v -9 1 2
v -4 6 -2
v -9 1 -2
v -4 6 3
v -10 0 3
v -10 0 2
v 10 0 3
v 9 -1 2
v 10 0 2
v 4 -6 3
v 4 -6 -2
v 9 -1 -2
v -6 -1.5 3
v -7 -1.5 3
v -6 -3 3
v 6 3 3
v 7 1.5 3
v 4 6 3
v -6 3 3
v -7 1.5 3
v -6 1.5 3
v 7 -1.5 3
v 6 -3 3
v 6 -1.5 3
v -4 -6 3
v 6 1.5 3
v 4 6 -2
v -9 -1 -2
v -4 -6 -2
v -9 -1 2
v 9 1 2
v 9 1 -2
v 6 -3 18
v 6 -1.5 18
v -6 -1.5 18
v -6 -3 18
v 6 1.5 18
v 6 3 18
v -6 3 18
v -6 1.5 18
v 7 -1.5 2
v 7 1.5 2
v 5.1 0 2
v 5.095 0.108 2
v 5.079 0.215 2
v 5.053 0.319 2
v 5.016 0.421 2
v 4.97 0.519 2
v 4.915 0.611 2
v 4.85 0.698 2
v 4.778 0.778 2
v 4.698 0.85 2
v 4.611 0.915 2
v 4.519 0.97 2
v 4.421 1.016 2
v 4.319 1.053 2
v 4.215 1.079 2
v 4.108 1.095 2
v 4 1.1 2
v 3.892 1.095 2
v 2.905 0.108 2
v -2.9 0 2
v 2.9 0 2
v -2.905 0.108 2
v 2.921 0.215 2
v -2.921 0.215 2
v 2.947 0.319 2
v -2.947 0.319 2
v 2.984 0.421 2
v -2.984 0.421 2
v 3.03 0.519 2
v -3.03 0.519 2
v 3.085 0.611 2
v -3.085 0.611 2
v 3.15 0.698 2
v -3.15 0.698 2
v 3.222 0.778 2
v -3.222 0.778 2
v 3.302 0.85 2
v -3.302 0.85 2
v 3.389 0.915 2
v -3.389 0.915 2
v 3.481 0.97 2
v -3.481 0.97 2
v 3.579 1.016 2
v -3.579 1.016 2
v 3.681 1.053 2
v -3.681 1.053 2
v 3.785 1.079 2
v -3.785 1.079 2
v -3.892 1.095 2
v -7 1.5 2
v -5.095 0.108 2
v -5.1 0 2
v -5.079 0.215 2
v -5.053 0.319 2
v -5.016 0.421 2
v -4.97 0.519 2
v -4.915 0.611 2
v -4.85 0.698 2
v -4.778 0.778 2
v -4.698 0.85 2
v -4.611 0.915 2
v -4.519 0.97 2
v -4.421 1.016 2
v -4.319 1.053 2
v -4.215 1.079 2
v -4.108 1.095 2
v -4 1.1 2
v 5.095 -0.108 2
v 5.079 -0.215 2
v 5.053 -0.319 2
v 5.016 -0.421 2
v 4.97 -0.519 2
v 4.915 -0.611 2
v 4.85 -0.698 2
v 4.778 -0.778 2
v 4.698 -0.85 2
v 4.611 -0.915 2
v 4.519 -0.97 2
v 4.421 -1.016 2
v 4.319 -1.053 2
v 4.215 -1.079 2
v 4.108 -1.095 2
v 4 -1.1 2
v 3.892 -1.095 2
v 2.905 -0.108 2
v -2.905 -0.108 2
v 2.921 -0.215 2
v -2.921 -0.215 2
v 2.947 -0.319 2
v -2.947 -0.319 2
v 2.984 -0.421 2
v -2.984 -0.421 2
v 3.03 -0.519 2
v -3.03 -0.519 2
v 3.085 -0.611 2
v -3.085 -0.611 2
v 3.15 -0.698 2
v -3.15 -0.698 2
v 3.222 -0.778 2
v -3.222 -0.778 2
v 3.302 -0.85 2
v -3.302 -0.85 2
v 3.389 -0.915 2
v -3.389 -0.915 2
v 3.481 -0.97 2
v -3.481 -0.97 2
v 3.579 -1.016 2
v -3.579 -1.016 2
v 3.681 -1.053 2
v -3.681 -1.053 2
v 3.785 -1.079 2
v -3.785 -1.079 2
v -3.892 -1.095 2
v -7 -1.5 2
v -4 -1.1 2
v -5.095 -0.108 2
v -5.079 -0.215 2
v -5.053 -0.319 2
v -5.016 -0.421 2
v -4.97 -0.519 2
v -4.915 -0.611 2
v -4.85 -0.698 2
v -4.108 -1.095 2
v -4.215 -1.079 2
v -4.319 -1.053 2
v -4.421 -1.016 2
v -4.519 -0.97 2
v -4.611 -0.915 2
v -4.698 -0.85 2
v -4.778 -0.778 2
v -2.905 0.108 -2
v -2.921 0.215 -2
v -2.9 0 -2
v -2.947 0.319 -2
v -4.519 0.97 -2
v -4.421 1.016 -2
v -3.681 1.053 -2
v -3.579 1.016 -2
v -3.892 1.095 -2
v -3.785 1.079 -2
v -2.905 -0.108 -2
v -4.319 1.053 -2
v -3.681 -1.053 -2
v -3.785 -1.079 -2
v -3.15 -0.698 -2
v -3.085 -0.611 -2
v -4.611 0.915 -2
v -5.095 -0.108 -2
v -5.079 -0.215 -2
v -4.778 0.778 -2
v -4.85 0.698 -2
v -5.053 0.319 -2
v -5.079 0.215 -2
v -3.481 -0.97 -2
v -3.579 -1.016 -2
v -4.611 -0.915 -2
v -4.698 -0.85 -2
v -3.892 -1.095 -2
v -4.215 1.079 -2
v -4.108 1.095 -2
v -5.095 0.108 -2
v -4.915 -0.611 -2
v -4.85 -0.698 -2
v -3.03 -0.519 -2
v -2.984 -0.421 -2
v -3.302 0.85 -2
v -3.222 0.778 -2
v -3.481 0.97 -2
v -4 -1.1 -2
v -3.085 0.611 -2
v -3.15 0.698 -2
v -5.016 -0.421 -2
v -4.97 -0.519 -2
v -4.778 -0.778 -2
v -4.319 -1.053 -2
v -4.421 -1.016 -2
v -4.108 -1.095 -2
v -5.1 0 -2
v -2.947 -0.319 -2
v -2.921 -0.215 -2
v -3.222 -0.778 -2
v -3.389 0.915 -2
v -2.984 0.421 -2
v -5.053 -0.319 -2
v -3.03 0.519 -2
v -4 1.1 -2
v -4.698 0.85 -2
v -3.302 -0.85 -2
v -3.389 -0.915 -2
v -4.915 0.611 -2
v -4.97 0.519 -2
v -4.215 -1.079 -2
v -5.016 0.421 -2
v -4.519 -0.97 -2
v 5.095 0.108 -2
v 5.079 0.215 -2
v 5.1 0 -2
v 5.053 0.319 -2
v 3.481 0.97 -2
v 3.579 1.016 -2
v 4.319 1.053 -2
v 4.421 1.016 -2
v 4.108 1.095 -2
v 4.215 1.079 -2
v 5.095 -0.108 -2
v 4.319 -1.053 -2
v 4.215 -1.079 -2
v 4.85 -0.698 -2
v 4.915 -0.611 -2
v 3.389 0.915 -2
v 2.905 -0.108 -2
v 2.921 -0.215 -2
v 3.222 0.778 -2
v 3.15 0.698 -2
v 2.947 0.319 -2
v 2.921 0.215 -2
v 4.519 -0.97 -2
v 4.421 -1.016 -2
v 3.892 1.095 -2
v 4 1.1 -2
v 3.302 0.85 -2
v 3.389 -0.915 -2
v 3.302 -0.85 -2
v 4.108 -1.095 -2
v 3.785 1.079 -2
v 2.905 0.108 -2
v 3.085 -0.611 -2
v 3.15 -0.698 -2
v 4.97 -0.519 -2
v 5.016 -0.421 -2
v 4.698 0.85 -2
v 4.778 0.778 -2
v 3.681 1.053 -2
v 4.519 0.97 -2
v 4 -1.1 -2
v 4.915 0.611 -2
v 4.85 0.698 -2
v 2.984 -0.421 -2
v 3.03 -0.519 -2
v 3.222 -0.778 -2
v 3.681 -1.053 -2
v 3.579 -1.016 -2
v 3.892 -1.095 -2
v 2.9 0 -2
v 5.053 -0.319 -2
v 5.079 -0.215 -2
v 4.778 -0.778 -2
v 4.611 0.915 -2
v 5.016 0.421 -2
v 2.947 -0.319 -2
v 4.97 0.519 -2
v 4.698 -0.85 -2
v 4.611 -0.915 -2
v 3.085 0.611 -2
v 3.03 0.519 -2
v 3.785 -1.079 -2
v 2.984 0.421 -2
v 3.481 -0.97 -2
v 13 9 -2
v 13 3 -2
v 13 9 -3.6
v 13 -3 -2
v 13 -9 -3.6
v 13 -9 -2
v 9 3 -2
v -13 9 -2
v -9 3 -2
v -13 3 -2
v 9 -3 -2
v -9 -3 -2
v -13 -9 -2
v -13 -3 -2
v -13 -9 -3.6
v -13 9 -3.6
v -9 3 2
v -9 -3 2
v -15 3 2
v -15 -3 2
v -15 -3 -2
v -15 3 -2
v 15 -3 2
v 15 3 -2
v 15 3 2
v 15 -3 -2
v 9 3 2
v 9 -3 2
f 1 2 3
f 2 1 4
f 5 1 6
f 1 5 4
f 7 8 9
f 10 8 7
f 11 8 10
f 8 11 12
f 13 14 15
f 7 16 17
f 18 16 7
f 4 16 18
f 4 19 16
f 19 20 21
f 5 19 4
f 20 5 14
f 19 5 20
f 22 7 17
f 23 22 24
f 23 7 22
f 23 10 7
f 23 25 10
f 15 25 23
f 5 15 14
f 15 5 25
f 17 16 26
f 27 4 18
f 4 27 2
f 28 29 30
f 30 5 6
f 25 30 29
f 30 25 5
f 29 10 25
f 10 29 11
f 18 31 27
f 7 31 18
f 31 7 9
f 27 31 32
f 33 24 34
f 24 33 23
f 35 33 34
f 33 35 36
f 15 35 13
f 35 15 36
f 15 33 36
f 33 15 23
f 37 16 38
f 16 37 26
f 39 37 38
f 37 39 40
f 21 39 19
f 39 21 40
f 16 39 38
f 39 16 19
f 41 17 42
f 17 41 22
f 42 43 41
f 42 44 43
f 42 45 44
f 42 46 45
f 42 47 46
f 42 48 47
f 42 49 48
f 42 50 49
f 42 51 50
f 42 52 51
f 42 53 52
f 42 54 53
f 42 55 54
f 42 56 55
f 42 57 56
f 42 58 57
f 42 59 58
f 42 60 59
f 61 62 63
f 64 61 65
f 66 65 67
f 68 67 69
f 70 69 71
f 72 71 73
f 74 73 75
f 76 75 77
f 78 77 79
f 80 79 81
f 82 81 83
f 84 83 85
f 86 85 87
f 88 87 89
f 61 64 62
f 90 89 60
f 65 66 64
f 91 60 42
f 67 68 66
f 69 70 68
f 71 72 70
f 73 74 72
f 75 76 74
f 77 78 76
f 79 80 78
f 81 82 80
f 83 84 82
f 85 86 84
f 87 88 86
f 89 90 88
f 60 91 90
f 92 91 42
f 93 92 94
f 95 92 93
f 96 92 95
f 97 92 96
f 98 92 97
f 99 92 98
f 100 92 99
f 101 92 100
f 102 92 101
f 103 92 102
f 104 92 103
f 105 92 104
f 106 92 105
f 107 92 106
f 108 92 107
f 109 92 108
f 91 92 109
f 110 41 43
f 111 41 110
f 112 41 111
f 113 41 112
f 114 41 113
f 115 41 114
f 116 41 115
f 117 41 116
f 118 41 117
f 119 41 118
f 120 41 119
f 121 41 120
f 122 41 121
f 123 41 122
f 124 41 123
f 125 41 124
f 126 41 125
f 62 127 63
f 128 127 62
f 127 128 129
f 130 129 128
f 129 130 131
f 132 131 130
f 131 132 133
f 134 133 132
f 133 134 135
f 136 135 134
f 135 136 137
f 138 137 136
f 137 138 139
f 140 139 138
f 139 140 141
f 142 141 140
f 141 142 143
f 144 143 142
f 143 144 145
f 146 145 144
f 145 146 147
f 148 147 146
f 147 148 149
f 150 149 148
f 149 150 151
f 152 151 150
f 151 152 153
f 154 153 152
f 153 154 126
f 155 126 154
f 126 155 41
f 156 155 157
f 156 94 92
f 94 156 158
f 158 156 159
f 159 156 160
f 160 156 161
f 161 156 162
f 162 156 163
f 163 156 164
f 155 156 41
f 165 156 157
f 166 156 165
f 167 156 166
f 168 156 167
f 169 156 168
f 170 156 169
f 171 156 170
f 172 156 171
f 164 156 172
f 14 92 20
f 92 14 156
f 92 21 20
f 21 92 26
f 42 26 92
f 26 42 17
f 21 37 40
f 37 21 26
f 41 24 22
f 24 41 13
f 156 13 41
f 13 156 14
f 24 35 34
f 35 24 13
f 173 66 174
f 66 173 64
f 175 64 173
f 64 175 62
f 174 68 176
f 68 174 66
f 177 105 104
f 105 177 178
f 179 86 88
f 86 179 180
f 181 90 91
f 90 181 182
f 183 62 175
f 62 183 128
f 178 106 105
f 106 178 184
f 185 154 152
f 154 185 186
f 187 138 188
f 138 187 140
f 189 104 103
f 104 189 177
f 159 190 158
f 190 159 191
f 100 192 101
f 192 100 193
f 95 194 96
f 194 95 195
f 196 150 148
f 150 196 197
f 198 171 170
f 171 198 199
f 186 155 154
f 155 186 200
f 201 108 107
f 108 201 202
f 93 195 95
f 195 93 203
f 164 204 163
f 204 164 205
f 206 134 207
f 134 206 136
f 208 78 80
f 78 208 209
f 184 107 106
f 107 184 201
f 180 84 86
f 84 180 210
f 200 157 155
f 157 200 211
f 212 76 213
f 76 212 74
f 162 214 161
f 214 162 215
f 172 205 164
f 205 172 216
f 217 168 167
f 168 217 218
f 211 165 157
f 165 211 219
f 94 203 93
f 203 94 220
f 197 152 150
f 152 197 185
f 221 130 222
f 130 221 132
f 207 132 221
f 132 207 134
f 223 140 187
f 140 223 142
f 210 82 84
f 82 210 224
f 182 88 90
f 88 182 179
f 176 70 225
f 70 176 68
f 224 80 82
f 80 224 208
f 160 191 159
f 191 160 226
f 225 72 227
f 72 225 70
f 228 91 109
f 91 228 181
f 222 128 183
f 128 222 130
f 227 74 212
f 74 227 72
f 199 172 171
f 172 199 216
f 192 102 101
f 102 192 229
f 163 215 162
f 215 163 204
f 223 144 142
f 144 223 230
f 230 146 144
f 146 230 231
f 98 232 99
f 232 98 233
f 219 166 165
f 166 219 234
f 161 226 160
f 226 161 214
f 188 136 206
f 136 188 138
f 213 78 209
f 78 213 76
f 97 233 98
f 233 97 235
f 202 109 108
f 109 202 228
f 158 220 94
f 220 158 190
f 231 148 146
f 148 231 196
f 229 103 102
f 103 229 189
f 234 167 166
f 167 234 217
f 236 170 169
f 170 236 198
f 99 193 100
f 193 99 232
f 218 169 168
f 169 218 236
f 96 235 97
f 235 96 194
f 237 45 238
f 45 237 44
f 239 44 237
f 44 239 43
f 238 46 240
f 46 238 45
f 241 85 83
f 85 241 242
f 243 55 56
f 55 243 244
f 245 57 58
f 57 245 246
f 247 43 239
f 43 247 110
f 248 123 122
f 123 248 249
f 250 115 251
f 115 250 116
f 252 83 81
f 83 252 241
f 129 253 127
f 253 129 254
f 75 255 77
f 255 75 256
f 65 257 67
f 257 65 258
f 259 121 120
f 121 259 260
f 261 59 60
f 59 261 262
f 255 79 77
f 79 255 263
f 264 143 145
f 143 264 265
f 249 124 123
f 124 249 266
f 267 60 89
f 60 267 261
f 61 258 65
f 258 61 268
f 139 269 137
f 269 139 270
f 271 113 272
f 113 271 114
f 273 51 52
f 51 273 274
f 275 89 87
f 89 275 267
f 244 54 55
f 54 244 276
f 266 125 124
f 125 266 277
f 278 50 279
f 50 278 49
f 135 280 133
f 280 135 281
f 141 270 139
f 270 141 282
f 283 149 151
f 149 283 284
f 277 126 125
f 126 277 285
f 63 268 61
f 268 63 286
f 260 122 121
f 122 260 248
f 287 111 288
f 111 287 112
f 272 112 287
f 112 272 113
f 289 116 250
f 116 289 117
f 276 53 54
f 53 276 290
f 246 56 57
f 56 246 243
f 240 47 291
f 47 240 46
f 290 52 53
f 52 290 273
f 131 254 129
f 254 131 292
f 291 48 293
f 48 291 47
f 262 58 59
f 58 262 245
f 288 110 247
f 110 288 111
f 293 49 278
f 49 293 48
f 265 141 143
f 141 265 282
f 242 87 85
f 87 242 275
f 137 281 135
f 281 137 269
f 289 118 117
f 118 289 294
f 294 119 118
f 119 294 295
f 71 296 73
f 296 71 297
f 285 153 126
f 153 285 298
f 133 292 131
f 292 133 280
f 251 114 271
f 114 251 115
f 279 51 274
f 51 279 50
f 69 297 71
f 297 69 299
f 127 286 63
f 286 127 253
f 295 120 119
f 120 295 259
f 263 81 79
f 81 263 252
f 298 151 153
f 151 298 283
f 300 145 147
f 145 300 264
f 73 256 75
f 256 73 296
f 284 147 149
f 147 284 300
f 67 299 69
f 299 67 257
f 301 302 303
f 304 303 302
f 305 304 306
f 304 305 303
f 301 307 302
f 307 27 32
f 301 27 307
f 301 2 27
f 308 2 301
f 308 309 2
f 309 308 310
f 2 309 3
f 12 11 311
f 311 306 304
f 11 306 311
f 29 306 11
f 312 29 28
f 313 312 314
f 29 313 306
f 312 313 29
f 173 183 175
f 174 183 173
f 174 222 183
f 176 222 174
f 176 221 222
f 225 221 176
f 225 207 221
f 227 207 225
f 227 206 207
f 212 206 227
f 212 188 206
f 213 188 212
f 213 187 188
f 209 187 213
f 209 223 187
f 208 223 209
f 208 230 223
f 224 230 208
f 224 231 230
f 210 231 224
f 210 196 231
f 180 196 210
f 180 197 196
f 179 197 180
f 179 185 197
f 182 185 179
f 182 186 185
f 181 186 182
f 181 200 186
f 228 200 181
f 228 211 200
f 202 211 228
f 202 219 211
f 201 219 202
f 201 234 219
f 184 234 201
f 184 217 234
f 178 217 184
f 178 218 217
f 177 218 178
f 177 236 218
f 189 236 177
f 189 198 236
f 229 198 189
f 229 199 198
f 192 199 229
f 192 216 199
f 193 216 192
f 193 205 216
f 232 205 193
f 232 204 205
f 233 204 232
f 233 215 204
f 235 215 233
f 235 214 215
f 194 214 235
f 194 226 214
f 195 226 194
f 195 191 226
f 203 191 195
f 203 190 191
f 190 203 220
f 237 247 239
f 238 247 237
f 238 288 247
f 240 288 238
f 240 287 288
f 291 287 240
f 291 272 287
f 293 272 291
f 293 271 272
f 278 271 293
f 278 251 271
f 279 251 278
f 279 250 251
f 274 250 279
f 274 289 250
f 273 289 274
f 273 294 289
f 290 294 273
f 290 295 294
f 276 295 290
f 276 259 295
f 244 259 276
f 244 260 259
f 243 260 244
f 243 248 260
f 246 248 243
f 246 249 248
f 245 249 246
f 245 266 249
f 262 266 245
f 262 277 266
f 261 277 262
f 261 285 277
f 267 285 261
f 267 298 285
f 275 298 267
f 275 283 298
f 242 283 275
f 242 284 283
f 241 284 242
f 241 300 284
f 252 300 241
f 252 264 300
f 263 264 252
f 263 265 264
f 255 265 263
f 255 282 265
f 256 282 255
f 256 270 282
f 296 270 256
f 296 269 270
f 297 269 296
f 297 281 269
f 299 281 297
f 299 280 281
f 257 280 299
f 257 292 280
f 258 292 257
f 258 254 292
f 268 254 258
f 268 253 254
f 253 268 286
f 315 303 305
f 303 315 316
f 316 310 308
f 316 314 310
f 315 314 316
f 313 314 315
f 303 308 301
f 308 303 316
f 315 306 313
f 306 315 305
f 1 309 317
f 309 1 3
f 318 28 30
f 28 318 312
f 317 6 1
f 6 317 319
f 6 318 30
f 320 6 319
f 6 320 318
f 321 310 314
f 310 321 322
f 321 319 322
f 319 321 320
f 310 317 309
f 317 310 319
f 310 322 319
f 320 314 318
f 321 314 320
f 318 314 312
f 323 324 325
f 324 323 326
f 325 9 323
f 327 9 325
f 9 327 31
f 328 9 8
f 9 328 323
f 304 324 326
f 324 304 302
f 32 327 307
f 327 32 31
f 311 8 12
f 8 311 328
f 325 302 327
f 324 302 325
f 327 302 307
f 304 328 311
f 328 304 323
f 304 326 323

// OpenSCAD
// Parameters
base_width = 12; //[6:24:0.5]
base_height = 6; //[3:12:0.5]
gap_width = 3; //[1.5:6:0.25]
gap_height = 10; //[5:20:0.5]
stem_width = 2.5; //[1.25:5:0.25]
hole_diameter = 2.2; //[1.1:4.4:0.1]
hole_spacing = 8; //[4:16:0.5]
pcb_thickness = 1.6; //[0.8:3.2:0.1]
pcb_margin = 3; //[1.5:6:0.5]
base_plate_thickness = 0.8; //[0.4:2:0.1]
overlap = 1; //[0.5:2:0.1]

$fn = 64;

// Derived sizes
pcb_w = hole_spacing + base_width + 2*pcb_margin;
pcb_d = base_width + 2*pcb_margin;

// Z stacking (intentional overlaps to ensure ONE connected solid)
z_body  = 0;
z_pcb   = -(base_height/2 + pcb_thickness/2 - overlap);
z_plate = z_pcb - (pcb_thickness/2 + base_plate_thickness/2 - overlap);

// Side terminals/blocks (added + attached with overlap)
term_w = 6;
term_d = 6;
term_h = 4;

// Place terminals on left/right of the body footprint and overlap into body by `overlap`
body_x_extent = hole_spacing/2 + base_width/2; // max X of the hex footprint
term_x = body_x_extent + term_w/2 - overlap;   // ensures intersection (no gap)
term_z = 0;                                    // centered on body so it intersects

module photo_interrupter_solid() {
  union() {

    // PCB (solid) - overlaps into body
    translate([0, 0, z_pcb])
      cube([pcb_w, pcb_d, pcb_thickness], center=true);

    // Base Plate (solid) - overlaps into PCB
    translate([0, 0, z_plate])
      cube([pcb_w, pcb_d, base_plate_thickness], center=true);

    // Left/Right side blocks/terminals (solid) - ATTACHED (overlap into body)
    translate([-term_x, 0, term_z])
      cube([term_w, term_d, term_h], center=true);

    translate([ term_x, 0, term_z])
      cube([term_w, term_d, term_h], center=true);

    // Photo interrupter body + arms with gap cutout and mounting holes
    // (This is the actual photo interrupter geometry; kept, but ensured connected via overlaps)
    difference() {
      union() {
        // Main body (hex-like footprint)
        translate([0, 0, z_body])
          linear_extrude(height=base_height, center=true)
            polygon(points=[
              [-hole_spacing/2 - base_width/2, 0],
              [-hole_spacing/2, -base_width/2],
              [ hole_spacing/2, -base_width/2],
              [ hole_spacing/2 + base_width/2, 0],
              [ hole_spacing/2,  base_width/2],
              [-hole_spacing/2,  base_width/2]
            ]);

        // Stems/Arms (connected to body by overlapping into body thickness)
        arm_h = gap_height + base_height;
        arm_z = (base_height/2 - overlap) + arm_h/2;

        translate([0, -(gap_width/2 + stem_width/2 - overlap), arm_z])
          cube([base_width, stem_width, arm_h], center=true);

        translate([0,  (gap_width/2 + stem_width/2 - overlap), arm_z])
          cube([base_width, stem_width, arm_h], center=true);
      }

      // Interrupter Gap (cutout between arms)
      gap_h = gap_height + base_height + 2*overlap;
      gap_z = (base_height/2 - overlap) + gap_h/2;

      translate([0, 0, gap_z])
        cube([base_width + 2*overlap, gap_width, gap_h], center=true);

      // Mounting holes: cut through BODY + PCB + BASE PLATE
      hole_h = (base_height + pcb_thickness + base_plate_thickness) + 4*overlap;
      hole_z = (z_plate - base_plate_thickness/2) + hole_h/2 - overlap;

      translate([-hole_spacing/2, 0, hole_z])
        cylinder(r=hole_diameter/2, h=hole_h, center=true);

      translate([ hole_spacing/2, 0, hole_z])
        cylinder(r=hole_diameter/2, h=hole_h, center=true);
    }
  }
}

photo_interrupter_solid();
